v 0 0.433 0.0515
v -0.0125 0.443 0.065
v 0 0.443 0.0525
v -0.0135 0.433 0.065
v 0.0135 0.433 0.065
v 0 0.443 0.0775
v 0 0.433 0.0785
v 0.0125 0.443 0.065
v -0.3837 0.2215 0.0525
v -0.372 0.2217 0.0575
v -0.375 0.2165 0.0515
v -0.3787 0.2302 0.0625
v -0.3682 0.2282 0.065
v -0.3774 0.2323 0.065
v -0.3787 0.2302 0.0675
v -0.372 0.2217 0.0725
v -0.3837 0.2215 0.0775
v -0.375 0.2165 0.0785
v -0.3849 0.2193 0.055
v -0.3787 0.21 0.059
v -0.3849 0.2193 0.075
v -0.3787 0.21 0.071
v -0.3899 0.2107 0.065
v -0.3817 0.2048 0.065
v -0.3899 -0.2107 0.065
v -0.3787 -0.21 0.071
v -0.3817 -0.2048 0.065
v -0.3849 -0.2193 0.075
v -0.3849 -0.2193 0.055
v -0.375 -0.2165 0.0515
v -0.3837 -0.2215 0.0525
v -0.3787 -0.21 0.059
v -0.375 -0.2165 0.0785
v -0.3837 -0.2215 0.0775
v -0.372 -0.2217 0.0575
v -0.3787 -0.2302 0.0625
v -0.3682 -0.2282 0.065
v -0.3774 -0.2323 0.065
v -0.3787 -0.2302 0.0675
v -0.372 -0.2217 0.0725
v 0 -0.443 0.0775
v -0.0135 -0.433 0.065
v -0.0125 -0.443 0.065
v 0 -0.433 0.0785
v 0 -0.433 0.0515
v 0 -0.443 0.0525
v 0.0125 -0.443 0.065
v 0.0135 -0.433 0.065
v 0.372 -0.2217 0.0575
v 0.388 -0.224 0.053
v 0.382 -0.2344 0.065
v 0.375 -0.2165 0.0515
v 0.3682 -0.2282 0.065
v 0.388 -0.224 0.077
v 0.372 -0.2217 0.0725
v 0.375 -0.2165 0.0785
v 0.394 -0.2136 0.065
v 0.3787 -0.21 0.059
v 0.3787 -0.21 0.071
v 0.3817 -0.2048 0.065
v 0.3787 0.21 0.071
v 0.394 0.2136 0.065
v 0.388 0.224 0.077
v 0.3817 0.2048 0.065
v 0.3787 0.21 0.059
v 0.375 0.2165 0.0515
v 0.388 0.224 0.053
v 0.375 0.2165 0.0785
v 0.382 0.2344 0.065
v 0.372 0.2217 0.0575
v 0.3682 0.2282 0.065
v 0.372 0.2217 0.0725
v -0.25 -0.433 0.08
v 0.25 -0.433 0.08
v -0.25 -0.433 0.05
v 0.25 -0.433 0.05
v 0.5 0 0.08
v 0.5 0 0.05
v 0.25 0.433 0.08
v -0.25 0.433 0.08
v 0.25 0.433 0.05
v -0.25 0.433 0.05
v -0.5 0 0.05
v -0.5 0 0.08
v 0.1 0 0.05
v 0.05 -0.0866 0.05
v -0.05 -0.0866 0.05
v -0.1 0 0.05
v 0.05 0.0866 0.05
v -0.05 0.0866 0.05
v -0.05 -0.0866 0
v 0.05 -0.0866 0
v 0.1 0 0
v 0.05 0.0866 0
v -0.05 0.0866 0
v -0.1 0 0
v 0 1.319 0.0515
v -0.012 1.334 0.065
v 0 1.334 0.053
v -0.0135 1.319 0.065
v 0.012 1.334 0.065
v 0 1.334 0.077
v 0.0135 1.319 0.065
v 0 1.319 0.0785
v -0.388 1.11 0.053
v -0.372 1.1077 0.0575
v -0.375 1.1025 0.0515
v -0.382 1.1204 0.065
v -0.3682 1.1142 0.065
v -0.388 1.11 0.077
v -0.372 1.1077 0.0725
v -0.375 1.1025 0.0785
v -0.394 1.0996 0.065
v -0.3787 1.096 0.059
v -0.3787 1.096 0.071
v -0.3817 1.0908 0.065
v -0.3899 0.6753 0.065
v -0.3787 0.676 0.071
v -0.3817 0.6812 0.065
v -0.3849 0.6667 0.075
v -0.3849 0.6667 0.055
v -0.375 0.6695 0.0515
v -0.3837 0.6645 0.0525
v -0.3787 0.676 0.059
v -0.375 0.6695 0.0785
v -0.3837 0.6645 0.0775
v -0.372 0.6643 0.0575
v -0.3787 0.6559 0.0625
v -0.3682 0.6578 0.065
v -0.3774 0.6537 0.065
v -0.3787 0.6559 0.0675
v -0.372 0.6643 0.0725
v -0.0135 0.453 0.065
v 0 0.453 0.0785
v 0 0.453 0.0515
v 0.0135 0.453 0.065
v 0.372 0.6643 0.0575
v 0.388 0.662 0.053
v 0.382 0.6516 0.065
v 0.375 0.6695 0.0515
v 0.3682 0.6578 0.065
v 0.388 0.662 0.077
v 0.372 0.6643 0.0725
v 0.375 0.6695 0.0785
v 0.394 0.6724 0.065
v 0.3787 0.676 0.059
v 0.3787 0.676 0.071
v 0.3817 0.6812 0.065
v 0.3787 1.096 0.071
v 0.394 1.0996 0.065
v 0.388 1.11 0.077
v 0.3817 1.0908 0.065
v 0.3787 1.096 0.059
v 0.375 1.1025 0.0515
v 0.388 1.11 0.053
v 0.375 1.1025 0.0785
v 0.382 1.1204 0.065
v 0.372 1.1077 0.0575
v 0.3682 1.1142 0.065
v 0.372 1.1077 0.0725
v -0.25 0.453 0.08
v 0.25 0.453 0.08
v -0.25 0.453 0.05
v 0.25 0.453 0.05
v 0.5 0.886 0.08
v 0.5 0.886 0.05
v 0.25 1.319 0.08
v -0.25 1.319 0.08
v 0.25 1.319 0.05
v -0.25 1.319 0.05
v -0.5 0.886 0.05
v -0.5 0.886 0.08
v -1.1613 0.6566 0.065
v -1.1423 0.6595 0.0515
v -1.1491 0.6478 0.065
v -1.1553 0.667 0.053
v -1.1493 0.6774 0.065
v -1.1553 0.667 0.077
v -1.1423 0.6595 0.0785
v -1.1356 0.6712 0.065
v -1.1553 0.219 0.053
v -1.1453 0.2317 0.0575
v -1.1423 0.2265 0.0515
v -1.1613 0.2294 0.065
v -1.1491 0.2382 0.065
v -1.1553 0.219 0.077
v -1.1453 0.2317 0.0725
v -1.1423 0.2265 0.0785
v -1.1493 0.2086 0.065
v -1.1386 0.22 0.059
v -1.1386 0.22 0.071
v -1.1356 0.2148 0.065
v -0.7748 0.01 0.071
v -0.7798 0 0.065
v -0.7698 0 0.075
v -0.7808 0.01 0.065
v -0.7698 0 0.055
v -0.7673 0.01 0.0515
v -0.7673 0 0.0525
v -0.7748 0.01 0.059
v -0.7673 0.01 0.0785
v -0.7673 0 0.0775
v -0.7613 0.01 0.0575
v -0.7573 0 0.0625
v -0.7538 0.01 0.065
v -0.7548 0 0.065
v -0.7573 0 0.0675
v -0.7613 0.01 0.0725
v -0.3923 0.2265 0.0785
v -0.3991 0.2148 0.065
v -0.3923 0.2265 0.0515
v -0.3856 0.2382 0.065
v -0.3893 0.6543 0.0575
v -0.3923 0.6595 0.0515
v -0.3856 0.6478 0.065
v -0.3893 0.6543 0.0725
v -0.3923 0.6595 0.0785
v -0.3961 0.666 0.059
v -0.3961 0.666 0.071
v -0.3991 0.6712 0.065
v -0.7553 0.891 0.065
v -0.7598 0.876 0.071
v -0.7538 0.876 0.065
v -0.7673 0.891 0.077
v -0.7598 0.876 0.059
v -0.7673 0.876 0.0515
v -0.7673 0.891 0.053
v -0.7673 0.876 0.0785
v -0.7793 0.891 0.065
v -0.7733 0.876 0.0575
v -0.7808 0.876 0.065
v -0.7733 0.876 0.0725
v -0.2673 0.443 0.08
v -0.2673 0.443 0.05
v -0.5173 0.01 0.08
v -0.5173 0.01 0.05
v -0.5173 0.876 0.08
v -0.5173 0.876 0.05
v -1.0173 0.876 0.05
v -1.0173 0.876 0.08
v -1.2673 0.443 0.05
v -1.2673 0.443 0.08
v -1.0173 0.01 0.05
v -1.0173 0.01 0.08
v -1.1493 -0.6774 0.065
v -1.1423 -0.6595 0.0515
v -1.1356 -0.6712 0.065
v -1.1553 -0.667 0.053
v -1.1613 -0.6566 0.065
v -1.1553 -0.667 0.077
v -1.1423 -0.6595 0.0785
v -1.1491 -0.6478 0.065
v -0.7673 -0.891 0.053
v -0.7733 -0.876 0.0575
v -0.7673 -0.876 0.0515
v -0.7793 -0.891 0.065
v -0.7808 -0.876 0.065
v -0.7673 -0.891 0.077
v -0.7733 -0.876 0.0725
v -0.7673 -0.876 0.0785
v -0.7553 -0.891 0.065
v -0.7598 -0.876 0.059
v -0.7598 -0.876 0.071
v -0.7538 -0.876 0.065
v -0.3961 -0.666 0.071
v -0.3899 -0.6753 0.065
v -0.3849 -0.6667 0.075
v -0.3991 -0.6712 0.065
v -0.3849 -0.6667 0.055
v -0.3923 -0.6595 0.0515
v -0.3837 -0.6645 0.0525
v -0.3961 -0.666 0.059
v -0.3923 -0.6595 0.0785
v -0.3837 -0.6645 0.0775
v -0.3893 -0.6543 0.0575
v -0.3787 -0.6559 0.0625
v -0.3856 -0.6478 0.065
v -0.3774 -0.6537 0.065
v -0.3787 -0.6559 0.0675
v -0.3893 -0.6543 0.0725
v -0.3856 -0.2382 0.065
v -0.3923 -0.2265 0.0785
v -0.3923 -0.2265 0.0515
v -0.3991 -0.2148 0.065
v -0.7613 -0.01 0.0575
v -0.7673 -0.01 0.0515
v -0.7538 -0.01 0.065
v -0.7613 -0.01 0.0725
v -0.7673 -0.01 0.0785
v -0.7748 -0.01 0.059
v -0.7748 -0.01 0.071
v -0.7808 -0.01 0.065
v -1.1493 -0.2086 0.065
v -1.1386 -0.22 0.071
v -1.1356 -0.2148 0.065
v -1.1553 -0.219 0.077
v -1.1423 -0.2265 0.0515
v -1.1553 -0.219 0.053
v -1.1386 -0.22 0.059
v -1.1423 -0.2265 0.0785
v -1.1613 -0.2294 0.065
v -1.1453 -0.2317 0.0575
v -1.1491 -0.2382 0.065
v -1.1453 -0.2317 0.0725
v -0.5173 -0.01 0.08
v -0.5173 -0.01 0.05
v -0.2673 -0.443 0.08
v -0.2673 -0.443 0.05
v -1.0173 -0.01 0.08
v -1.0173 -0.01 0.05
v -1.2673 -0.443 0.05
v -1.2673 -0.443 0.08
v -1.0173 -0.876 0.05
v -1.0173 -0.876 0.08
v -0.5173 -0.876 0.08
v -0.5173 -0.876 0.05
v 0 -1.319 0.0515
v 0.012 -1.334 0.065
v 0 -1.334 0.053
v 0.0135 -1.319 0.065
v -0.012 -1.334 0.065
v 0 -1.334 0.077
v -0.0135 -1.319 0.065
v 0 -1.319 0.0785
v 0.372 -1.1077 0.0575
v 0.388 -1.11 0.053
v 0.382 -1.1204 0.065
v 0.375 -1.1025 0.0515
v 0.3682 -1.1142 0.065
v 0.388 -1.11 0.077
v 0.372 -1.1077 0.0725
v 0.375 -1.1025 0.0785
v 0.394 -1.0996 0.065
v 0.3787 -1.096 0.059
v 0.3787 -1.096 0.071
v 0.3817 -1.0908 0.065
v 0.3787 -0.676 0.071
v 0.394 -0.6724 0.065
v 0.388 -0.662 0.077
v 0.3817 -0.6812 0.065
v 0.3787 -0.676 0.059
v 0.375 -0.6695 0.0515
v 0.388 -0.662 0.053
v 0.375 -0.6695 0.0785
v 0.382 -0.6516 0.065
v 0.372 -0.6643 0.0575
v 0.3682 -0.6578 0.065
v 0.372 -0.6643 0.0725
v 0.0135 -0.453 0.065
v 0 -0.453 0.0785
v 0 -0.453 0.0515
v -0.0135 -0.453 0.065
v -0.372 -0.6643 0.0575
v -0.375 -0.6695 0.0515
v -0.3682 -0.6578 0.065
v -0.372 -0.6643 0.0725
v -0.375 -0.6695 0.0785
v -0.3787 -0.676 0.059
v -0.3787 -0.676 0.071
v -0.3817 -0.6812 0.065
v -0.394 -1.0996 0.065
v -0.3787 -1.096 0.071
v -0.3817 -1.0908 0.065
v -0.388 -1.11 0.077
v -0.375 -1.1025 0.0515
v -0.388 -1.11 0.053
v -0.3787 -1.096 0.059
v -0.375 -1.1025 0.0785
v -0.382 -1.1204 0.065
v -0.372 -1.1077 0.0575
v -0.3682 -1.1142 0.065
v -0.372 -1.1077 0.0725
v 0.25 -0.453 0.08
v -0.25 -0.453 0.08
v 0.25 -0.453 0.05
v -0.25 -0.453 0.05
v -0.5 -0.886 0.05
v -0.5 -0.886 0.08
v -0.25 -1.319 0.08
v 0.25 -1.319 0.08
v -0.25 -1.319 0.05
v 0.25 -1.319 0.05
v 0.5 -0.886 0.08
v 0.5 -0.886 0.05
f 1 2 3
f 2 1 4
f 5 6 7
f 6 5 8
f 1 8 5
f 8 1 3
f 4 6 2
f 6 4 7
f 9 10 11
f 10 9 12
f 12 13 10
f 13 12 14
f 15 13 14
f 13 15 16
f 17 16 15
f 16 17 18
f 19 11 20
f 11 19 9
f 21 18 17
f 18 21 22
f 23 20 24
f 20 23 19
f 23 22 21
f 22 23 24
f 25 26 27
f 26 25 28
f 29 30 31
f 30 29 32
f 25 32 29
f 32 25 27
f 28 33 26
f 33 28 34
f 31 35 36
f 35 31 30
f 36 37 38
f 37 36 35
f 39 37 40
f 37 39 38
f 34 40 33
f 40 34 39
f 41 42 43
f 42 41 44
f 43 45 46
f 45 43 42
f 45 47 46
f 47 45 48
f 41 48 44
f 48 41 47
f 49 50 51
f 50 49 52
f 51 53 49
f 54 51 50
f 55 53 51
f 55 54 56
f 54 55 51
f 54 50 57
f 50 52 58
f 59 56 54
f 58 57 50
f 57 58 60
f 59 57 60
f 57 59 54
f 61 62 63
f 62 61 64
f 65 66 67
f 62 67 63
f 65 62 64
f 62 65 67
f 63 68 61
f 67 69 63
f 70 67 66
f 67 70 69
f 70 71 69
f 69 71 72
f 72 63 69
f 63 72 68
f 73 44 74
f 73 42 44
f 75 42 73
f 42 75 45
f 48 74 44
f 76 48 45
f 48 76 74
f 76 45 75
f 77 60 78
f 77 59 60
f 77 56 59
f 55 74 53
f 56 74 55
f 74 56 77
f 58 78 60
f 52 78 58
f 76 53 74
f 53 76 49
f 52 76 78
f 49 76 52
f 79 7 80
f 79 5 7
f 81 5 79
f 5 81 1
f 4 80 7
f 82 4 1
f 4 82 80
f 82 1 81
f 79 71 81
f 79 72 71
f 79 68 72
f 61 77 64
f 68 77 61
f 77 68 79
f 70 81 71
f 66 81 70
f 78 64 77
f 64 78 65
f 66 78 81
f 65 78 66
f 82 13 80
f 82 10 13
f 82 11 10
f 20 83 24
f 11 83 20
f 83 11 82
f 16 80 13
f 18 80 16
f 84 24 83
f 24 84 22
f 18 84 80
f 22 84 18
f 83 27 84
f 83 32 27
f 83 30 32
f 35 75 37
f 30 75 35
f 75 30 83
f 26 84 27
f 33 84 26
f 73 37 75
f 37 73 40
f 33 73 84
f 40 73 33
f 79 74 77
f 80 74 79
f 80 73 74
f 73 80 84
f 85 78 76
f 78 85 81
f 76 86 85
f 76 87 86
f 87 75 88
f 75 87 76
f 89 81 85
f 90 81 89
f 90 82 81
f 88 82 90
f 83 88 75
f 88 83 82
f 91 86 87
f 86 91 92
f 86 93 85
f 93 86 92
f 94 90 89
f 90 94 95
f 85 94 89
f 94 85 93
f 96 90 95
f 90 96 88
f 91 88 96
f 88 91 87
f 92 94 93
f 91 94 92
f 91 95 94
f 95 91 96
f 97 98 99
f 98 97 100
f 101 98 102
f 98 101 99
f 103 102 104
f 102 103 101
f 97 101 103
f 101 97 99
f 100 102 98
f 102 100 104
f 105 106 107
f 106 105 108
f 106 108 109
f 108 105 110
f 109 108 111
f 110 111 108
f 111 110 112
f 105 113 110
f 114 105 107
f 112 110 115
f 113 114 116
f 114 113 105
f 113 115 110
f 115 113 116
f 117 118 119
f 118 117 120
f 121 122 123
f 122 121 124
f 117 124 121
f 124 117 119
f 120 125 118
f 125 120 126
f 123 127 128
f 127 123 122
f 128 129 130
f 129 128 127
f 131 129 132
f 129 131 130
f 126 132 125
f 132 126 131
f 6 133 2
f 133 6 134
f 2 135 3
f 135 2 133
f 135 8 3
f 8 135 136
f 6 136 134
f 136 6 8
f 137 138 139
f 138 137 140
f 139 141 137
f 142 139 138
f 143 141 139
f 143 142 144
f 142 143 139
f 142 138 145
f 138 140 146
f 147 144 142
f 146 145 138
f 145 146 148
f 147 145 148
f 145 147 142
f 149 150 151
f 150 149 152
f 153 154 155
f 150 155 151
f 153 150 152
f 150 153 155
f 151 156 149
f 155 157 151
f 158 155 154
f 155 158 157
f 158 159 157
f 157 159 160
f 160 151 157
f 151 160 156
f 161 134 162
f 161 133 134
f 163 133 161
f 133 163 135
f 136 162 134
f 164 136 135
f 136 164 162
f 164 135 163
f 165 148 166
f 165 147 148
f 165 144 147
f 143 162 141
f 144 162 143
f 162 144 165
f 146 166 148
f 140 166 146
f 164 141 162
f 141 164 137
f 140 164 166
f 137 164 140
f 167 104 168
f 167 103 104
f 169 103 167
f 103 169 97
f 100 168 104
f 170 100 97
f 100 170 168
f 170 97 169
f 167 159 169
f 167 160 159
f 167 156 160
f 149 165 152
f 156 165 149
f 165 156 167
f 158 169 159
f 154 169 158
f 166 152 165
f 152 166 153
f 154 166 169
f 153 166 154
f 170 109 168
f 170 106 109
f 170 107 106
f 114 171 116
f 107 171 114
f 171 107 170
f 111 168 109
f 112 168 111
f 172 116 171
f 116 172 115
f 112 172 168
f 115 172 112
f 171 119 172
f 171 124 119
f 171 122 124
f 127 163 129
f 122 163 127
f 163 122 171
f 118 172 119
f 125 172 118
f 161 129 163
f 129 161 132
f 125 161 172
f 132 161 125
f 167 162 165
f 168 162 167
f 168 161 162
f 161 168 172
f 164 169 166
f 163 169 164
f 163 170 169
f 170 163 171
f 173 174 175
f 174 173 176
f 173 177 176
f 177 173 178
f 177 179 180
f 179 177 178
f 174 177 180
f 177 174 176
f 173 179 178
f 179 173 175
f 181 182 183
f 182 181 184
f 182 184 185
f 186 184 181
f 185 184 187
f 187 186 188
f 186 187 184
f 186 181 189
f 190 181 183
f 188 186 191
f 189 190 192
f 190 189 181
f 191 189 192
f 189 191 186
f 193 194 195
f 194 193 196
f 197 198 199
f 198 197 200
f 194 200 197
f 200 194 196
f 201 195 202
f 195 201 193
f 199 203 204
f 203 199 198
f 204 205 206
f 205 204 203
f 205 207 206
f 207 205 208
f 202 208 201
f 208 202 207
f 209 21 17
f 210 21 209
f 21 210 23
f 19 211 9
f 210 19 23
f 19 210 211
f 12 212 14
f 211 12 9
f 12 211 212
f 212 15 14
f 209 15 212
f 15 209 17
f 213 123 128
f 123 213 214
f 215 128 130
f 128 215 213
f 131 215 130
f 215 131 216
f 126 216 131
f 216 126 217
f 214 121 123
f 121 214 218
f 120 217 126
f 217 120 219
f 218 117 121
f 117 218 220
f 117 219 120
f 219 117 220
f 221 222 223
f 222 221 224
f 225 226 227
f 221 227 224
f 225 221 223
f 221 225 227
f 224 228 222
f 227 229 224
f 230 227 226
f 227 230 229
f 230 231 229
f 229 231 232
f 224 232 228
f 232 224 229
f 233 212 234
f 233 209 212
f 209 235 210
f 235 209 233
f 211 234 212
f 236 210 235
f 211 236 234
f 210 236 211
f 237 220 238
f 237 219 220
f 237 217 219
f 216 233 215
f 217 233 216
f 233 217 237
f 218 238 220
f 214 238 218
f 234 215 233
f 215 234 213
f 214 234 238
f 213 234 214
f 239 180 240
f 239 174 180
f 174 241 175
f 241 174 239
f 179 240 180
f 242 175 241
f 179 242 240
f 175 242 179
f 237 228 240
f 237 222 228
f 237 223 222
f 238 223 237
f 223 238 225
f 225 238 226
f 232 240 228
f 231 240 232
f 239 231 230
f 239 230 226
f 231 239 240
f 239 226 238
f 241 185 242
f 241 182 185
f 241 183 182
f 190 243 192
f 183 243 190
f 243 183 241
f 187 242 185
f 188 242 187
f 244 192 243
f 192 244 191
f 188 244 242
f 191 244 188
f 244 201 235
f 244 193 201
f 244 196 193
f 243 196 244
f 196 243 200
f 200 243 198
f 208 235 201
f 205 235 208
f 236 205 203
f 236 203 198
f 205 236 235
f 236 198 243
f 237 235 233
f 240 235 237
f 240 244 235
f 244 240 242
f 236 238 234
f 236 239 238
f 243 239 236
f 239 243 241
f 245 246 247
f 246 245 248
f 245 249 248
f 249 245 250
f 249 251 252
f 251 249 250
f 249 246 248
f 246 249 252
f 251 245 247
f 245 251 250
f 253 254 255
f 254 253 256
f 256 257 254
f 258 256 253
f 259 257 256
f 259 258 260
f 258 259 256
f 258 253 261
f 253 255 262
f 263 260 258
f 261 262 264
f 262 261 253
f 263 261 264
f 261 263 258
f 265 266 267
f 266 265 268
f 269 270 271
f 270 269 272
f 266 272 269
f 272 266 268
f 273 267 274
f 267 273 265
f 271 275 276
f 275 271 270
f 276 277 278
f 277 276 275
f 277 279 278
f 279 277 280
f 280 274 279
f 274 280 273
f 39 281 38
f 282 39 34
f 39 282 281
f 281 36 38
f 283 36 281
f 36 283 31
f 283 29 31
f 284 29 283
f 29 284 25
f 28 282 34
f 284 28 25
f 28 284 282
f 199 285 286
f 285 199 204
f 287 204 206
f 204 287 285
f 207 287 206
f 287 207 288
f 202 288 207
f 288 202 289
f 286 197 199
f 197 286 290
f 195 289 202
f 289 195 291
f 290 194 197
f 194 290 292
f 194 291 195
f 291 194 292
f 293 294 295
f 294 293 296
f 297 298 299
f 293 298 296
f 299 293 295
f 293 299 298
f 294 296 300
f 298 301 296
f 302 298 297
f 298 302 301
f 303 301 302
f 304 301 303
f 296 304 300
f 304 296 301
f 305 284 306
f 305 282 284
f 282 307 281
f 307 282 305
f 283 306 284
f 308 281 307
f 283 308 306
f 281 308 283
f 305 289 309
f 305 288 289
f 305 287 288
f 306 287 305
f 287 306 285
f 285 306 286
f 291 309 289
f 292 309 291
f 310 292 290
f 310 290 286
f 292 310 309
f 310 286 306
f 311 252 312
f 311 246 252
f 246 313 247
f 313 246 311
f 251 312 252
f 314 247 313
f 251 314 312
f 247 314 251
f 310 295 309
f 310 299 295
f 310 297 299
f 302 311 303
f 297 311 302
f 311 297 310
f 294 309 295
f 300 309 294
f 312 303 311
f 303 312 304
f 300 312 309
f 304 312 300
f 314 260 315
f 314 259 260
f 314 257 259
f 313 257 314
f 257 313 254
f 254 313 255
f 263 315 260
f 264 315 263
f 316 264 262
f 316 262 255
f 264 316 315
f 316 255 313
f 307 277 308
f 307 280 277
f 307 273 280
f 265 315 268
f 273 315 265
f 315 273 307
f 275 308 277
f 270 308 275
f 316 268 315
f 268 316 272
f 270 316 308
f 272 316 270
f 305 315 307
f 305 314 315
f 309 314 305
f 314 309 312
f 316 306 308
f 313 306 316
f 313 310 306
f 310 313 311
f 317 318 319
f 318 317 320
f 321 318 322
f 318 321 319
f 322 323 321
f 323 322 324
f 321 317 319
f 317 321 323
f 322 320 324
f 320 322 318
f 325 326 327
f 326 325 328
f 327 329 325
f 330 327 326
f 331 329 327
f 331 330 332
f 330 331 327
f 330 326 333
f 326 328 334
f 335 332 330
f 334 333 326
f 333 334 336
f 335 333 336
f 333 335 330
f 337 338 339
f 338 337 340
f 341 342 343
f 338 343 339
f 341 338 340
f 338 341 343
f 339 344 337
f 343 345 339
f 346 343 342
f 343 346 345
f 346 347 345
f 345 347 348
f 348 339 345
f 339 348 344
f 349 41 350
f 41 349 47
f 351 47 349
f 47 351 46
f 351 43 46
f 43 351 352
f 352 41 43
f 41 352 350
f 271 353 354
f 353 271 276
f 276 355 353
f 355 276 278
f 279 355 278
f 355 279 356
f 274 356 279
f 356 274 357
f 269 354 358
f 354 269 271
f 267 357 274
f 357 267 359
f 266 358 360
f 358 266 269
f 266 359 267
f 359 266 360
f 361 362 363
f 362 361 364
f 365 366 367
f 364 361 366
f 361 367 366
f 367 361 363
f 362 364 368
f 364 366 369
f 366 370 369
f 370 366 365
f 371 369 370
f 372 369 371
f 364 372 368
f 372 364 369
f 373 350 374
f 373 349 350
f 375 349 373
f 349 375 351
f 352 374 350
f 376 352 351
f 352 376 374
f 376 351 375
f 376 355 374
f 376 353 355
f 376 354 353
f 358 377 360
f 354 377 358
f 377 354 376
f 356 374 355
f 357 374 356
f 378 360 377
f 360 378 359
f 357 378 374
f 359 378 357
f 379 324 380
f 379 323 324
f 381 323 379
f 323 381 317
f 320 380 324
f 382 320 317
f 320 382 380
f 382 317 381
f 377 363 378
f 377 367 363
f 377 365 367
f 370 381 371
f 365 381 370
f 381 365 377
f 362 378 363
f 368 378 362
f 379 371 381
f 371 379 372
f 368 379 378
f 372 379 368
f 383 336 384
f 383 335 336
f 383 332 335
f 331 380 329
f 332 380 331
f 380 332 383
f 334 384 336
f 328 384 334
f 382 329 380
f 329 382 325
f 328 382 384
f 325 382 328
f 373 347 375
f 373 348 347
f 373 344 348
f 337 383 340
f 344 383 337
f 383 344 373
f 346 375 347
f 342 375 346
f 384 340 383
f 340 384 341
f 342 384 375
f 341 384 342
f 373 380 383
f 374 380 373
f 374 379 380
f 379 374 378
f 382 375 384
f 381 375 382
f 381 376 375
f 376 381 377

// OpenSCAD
// file: hexagon.scad
module hexagon_tile(R, h_center_grip=0,R_grips_center=0){

H = 0.03;
R_grips = H/2;
h_grips = 0.03;

//translate([0,sin(60)*R+h_grips/2,0])    
// sin(60)*R+0.05/2 em y
union(){
//difference(){    
cylinder(h = H, r1 = R, r2 = R, center = true, $fn=6);
//translate([0,0,-H/2])
//cylinder(h = H, r1 = R-0.05, r2 = R-0.05, center = true, $fn=6);
//}
for (i = [1:6]){
    rotate([0,0,(i-1)*60])
    translate([0,cos(30)*R,0])
    rotate([90,0,0])
    cylinder(h = h_grips, r1 = 0.8*R_grips, r2 = R_grips, center = true, $fn=4); 
}
translate([0,0,-(h_center_grip+H)/2])
cylinder(h = h_center_grip, r1 = R_grips_center, r2 = R_grips_center, center = true, $fn=6); 
}
}

hexagon_tile(R=1);
// main file
use <hexagon.scad>

R = 0.5;
translate([0,0,0.05+0.03/2])
//rotate([0,0,150])
union(){
hexagon_tile(R, h_center_grip=0.05,R_grips_center=0.1);
for (i = [1:4]) {
    rotate([0,0,(i-1)*60])
    translate([0,cos(30)*2*R+0.03-1e-2,0])
    hexagon_tile(R); 
}

}
